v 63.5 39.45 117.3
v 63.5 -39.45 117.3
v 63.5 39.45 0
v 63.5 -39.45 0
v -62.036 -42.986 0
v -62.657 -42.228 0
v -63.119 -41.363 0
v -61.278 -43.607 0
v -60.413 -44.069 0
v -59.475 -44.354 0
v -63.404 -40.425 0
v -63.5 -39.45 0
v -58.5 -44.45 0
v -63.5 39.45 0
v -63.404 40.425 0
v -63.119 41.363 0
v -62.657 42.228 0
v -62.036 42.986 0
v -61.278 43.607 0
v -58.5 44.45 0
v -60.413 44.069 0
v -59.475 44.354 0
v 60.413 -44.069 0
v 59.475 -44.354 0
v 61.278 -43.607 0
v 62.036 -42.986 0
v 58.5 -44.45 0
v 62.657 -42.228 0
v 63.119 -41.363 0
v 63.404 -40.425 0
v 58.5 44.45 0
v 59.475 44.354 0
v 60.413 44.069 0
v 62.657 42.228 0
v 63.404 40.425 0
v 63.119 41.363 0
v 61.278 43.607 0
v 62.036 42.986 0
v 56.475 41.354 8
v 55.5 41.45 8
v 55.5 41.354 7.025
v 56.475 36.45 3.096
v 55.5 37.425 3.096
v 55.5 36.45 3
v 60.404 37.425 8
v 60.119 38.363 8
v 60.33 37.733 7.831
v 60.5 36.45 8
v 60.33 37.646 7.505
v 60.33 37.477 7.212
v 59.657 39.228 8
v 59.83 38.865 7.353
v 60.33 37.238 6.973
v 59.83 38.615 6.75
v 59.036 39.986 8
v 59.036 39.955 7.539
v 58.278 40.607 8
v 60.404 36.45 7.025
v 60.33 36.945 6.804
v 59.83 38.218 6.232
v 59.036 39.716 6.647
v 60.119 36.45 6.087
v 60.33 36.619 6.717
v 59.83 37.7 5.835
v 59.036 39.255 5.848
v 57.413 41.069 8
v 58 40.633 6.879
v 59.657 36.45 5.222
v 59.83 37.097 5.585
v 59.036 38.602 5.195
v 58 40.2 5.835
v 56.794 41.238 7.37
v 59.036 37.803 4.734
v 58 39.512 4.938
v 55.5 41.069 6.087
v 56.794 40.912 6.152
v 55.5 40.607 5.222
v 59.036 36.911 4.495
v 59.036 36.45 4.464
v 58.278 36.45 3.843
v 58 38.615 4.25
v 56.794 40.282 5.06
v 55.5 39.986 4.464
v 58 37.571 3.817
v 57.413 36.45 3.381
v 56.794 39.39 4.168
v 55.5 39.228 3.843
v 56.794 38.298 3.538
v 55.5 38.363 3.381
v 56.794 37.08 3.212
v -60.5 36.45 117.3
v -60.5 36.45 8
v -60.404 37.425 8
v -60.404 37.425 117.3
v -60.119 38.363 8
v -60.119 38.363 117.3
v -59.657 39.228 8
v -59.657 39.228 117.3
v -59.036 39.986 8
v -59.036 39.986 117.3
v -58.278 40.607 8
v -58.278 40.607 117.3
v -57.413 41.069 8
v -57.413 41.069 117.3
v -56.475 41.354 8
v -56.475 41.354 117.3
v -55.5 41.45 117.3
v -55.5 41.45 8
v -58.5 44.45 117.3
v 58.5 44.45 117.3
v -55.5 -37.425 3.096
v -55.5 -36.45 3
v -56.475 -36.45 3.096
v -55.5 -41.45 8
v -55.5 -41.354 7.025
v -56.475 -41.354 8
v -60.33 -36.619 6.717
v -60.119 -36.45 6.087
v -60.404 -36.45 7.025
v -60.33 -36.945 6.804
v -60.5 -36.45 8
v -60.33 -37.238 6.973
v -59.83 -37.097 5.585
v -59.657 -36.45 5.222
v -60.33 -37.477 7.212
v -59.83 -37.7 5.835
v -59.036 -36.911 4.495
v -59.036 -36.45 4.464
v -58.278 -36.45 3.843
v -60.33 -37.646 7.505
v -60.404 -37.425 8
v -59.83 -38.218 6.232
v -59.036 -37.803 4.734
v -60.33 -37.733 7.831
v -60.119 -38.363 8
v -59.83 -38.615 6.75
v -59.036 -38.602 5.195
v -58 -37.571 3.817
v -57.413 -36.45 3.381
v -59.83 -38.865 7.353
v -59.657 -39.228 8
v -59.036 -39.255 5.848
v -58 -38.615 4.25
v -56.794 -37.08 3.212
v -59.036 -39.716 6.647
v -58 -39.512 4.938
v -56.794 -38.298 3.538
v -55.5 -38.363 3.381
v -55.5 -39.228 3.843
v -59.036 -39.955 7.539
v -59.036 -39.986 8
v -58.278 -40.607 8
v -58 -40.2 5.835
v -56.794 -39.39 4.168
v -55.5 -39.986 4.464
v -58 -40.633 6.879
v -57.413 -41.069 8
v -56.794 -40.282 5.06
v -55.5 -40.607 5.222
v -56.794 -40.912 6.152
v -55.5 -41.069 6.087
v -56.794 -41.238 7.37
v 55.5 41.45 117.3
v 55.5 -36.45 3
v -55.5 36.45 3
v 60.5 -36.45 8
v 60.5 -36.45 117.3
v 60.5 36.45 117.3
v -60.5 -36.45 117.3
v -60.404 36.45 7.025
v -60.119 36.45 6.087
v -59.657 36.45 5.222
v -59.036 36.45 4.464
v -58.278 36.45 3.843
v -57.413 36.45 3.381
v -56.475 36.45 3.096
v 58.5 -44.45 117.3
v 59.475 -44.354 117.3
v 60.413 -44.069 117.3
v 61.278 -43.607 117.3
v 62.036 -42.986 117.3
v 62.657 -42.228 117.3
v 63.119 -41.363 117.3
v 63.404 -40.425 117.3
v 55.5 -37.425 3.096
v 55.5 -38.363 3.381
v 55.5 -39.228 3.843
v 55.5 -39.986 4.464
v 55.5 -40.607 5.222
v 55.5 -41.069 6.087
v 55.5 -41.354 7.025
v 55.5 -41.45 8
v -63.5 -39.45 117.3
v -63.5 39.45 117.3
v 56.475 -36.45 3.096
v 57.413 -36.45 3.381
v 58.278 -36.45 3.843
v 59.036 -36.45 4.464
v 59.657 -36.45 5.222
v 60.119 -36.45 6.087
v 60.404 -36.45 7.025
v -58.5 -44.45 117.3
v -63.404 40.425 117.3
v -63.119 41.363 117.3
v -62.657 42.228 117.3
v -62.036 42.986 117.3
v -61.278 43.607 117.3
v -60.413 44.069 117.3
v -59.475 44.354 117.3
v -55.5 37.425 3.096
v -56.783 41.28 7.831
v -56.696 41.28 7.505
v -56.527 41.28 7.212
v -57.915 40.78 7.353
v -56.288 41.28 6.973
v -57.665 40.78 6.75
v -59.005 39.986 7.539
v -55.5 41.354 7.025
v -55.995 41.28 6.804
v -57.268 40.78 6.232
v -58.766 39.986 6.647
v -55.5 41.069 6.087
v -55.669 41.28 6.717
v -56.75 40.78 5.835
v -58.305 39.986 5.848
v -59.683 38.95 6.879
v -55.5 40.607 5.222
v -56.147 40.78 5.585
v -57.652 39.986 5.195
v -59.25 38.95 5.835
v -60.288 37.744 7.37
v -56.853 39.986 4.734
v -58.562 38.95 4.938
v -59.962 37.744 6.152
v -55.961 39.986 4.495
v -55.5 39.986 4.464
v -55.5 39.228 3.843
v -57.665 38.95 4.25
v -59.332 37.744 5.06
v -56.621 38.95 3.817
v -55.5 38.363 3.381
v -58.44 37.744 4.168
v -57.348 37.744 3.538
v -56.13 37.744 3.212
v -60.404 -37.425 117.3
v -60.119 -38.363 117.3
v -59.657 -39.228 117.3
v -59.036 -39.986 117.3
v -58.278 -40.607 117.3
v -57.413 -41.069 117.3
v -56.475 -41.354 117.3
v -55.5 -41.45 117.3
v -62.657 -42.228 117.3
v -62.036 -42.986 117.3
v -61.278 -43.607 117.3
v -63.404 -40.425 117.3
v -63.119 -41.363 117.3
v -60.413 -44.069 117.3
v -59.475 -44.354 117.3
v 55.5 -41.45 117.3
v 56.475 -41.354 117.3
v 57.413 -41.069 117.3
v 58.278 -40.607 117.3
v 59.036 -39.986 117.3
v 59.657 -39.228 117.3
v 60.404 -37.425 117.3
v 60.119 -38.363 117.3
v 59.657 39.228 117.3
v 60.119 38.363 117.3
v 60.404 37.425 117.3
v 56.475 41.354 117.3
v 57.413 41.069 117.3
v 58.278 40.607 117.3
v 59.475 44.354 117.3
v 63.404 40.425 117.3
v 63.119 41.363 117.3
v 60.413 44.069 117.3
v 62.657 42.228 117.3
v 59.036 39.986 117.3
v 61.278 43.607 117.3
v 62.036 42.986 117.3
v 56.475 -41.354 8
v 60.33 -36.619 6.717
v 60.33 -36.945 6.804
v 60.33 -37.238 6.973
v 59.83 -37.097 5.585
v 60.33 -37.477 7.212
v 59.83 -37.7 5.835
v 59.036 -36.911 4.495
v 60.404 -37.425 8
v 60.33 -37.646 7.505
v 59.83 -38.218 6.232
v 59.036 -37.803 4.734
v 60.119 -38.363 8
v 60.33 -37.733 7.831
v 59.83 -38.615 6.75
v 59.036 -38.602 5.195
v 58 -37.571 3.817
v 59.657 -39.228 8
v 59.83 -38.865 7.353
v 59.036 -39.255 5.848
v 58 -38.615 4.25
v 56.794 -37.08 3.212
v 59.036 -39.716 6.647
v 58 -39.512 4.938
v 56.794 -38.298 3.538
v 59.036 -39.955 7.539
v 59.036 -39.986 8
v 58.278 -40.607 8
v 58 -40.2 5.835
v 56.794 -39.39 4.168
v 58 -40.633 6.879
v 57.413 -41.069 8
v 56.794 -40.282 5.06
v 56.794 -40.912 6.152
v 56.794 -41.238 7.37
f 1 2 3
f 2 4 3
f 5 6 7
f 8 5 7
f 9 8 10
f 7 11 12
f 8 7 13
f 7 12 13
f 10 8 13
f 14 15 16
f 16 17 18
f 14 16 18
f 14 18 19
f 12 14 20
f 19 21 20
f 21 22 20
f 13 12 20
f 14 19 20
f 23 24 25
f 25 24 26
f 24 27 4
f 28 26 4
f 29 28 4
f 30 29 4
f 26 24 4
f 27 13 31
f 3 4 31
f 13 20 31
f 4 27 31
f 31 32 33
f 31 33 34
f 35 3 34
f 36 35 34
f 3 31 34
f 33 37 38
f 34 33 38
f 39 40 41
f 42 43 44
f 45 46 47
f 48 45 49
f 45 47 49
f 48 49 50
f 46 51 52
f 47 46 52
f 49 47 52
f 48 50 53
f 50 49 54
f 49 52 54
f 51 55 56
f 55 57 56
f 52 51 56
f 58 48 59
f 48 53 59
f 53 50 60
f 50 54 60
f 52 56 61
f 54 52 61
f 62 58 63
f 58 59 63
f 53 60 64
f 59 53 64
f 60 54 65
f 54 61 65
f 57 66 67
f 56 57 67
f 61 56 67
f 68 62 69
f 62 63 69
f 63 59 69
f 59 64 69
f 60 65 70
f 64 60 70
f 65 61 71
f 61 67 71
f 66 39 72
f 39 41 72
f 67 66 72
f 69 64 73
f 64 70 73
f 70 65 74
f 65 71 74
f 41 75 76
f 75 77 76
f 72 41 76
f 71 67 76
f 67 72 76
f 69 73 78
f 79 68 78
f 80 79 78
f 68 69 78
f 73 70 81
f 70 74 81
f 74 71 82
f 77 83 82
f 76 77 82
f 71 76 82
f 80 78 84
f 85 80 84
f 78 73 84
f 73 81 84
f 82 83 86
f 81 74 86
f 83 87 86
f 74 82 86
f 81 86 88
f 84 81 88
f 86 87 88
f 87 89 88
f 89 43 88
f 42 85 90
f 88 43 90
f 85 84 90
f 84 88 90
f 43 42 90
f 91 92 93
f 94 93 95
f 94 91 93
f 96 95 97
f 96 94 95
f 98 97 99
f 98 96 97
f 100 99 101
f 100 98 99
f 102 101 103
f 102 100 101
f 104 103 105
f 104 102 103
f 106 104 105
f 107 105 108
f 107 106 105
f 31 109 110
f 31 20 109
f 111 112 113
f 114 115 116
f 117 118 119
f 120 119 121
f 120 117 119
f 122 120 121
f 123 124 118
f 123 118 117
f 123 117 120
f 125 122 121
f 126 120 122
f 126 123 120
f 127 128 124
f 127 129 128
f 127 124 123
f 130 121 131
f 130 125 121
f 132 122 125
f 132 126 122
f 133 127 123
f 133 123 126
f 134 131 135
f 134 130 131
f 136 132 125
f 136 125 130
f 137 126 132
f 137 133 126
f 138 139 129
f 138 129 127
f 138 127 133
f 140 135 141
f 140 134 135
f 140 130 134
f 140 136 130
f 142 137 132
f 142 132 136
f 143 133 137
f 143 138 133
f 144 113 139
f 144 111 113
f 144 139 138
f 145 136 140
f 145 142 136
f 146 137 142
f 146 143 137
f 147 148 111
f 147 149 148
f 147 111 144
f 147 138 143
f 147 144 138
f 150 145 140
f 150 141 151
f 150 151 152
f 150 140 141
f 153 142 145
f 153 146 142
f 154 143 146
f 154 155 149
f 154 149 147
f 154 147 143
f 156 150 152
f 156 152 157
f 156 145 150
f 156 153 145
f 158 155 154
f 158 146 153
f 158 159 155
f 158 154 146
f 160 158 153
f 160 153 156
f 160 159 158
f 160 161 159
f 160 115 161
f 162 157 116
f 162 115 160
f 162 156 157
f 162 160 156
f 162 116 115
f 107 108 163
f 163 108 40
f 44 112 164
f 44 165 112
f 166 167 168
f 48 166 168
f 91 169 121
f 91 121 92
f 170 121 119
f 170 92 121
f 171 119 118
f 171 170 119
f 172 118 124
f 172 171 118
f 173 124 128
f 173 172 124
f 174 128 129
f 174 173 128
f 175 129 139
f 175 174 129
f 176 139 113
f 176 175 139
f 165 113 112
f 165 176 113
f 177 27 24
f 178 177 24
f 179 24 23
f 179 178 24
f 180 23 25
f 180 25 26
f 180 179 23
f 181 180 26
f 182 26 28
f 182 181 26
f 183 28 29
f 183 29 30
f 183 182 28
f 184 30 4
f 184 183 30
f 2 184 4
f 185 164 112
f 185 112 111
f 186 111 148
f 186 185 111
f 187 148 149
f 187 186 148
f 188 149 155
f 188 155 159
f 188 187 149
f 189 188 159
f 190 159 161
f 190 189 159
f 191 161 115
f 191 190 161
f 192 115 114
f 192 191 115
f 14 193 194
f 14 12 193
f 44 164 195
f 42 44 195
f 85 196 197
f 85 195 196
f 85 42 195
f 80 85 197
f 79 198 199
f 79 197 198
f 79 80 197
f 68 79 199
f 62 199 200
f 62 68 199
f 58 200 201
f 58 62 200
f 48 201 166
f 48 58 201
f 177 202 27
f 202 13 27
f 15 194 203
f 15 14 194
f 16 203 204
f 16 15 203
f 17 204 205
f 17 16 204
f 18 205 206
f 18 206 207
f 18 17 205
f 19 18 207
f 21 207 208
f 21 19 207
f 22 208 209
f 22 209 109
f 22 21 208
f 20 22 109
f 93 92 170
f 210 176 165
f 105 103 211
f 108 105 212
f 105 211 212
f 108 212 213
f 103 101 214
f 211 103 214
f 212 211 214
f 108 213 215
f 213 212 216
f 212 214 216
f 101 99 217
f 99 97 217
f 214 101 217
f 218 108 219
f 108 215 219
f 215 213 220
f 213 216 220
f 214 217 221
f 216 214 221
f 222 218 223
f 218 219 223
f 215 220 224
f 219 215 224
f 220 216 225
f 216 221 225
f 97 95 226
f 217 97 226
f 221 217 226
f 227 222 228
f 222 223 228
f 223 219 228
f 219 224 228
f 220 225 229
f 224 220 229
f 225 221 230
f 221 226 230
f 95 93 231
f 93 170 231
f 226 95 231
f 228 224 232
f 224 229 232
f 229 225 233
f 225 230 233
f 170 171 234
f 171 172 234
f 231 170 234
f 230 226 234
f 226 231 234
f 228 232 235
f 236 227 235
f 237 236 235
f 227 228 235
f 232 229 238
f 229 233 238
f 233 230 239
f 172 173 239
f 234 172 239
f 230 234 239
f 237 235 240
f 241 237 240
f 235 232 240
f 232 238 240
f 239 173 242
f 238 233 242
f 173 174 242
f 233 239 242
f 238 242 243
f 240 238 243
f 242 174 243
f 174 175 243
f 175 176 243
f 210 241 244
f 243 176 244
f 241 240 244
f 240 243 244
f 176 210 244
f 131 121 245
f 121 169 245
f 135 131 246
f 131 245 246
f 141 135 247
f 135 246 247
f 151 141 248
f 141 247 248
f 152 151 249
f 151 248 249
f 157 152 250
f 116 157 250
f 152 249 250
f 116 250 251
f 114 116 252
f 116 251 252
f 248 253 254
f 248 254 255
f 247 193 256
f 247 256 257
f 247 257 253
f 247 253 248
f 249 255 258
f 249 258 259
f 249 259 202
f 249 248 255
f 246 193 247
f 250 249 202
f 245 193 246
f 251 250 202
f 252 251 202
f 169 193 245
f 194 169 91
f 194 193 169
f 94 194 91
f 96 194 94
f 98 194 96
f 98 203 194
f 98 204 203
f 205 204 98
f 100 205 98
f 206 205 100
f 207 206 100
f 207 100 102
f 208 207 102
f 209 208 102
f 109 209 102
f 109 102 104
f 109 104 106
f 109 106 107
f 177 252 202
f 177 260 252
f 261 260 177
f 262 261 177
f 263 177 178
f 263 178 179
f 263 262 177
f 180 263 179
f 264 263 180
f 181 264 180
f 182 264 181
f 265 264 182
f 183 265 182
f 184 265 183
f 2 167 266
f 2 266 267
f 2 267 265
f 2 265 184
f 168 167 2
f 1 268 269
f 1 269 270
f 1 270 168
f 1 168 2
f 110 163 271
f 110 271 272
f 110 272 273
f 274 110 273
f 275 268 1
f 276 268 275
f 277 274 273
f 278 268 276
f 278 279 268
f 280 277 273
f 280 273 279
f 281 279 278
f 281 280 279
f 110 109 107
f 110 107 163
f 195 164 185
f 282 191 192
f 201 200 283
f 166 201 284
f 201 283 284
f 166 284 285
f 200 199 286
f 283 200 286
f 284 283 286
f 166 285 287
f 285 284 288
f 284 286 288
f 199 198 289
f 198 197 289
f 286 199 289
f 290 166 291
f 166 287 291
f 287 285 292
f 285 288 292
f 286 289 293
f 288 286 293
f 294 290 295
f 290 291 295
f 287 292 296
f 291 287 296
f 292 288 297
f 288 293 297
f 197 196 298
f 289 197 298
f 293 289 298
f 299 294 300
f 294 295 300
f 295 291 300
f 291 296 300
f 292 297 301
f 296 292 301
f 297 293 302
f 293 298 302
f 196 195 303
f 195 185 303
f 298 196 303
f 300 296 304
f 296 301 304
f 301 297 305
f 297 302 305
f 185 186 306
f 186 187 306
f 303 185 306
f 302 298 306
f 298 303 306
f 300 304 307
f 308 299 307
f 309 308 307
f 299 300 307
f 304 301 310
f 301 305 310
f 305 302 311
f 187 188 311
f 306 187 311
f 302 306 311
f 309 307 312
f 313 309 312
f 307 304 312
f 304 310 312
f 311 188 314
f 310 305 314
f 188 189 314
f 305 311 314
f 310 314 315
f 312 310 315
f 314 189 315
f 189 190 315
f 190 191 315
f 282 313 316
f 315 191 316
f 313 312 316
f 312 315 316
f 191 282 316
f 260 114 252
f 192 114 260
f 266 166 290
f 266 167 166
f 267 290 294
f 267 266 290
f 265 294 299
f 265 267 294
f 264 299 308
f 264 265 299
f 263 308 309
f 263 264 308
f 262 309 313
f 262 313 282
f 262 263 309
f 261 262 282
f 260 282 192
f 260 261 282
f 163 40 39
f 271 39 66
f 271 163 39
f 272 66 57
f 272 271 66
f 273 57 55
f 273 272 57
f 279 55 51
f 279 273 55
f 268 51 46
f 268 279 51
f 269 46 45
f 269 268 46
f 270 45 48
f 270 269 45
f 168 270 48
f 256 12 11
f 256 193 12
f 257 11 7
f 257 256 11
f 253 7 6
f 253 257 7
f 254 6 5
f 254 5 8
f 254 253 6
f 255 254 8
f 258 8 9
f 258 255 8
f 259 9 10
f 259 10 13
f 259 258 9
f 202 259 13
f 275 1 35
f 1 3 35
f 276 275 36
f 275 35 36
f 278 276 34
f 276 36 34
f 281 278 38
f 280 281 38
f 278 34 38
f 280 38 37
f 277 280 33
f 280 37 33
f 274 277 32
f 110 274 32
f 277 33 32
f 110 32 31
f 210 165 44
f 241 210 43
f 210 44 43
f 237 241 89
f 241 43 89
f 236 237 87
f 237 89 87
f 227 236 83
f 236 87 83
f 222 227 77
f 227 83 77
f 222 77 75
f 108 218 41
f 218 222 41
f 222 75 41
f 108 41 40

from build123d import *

# Parameters (mm, degrees)
F0_W     = 127
F0_H     = 88.9
F1_DEPTH = 3
F2_W     = 127
F2_H     = 88.9
F2_W_2   = 121
F2_H_2   = 82.9
F3_DEPTH = 114.3
F4_R     = 5


with BuildPart() as f1:
    # F0 (on Top) → F1 (new body)
    with BuildSketch(Plane.XY):
        Rectangle(F0_W, F0_H)
    extrude(amount=F1_DEPTH)

    # F2 (on face) → F3 (join)
    with BuildSketch(Plane.XY.offset(3)):
        Rectangle(F2_W, F2_H)
        Rectangle(F2_W_2, F2_H_2, mode=Mode.SUBTRACT)
    extrude(amount=F3_DEPTH)

    # F4
    f4_edges = [f1.edges().sort_by_distance(p)[0] for p in [
        (0, -41.45, 3),
        (-60.5, 0, 3),
        (-60.5, -41.45, 60.15),
        (-60.5, 41.45, 60.15),
        (0, 41.45, 3),
        (60.5, 41.45, 60.15),
        (60.5, 0, 3),
        (60.5, -41.45, 60.15),
        (63.5, -44.45, 58.65),
        (63.5, 44.45, 58.65),
        (-63.5, 44.45, 58.65),
        (-63.5, -44.45, 58.65),
    ]]
    fillet(f4_edges, radius=F4_R)


solid = f1.part
